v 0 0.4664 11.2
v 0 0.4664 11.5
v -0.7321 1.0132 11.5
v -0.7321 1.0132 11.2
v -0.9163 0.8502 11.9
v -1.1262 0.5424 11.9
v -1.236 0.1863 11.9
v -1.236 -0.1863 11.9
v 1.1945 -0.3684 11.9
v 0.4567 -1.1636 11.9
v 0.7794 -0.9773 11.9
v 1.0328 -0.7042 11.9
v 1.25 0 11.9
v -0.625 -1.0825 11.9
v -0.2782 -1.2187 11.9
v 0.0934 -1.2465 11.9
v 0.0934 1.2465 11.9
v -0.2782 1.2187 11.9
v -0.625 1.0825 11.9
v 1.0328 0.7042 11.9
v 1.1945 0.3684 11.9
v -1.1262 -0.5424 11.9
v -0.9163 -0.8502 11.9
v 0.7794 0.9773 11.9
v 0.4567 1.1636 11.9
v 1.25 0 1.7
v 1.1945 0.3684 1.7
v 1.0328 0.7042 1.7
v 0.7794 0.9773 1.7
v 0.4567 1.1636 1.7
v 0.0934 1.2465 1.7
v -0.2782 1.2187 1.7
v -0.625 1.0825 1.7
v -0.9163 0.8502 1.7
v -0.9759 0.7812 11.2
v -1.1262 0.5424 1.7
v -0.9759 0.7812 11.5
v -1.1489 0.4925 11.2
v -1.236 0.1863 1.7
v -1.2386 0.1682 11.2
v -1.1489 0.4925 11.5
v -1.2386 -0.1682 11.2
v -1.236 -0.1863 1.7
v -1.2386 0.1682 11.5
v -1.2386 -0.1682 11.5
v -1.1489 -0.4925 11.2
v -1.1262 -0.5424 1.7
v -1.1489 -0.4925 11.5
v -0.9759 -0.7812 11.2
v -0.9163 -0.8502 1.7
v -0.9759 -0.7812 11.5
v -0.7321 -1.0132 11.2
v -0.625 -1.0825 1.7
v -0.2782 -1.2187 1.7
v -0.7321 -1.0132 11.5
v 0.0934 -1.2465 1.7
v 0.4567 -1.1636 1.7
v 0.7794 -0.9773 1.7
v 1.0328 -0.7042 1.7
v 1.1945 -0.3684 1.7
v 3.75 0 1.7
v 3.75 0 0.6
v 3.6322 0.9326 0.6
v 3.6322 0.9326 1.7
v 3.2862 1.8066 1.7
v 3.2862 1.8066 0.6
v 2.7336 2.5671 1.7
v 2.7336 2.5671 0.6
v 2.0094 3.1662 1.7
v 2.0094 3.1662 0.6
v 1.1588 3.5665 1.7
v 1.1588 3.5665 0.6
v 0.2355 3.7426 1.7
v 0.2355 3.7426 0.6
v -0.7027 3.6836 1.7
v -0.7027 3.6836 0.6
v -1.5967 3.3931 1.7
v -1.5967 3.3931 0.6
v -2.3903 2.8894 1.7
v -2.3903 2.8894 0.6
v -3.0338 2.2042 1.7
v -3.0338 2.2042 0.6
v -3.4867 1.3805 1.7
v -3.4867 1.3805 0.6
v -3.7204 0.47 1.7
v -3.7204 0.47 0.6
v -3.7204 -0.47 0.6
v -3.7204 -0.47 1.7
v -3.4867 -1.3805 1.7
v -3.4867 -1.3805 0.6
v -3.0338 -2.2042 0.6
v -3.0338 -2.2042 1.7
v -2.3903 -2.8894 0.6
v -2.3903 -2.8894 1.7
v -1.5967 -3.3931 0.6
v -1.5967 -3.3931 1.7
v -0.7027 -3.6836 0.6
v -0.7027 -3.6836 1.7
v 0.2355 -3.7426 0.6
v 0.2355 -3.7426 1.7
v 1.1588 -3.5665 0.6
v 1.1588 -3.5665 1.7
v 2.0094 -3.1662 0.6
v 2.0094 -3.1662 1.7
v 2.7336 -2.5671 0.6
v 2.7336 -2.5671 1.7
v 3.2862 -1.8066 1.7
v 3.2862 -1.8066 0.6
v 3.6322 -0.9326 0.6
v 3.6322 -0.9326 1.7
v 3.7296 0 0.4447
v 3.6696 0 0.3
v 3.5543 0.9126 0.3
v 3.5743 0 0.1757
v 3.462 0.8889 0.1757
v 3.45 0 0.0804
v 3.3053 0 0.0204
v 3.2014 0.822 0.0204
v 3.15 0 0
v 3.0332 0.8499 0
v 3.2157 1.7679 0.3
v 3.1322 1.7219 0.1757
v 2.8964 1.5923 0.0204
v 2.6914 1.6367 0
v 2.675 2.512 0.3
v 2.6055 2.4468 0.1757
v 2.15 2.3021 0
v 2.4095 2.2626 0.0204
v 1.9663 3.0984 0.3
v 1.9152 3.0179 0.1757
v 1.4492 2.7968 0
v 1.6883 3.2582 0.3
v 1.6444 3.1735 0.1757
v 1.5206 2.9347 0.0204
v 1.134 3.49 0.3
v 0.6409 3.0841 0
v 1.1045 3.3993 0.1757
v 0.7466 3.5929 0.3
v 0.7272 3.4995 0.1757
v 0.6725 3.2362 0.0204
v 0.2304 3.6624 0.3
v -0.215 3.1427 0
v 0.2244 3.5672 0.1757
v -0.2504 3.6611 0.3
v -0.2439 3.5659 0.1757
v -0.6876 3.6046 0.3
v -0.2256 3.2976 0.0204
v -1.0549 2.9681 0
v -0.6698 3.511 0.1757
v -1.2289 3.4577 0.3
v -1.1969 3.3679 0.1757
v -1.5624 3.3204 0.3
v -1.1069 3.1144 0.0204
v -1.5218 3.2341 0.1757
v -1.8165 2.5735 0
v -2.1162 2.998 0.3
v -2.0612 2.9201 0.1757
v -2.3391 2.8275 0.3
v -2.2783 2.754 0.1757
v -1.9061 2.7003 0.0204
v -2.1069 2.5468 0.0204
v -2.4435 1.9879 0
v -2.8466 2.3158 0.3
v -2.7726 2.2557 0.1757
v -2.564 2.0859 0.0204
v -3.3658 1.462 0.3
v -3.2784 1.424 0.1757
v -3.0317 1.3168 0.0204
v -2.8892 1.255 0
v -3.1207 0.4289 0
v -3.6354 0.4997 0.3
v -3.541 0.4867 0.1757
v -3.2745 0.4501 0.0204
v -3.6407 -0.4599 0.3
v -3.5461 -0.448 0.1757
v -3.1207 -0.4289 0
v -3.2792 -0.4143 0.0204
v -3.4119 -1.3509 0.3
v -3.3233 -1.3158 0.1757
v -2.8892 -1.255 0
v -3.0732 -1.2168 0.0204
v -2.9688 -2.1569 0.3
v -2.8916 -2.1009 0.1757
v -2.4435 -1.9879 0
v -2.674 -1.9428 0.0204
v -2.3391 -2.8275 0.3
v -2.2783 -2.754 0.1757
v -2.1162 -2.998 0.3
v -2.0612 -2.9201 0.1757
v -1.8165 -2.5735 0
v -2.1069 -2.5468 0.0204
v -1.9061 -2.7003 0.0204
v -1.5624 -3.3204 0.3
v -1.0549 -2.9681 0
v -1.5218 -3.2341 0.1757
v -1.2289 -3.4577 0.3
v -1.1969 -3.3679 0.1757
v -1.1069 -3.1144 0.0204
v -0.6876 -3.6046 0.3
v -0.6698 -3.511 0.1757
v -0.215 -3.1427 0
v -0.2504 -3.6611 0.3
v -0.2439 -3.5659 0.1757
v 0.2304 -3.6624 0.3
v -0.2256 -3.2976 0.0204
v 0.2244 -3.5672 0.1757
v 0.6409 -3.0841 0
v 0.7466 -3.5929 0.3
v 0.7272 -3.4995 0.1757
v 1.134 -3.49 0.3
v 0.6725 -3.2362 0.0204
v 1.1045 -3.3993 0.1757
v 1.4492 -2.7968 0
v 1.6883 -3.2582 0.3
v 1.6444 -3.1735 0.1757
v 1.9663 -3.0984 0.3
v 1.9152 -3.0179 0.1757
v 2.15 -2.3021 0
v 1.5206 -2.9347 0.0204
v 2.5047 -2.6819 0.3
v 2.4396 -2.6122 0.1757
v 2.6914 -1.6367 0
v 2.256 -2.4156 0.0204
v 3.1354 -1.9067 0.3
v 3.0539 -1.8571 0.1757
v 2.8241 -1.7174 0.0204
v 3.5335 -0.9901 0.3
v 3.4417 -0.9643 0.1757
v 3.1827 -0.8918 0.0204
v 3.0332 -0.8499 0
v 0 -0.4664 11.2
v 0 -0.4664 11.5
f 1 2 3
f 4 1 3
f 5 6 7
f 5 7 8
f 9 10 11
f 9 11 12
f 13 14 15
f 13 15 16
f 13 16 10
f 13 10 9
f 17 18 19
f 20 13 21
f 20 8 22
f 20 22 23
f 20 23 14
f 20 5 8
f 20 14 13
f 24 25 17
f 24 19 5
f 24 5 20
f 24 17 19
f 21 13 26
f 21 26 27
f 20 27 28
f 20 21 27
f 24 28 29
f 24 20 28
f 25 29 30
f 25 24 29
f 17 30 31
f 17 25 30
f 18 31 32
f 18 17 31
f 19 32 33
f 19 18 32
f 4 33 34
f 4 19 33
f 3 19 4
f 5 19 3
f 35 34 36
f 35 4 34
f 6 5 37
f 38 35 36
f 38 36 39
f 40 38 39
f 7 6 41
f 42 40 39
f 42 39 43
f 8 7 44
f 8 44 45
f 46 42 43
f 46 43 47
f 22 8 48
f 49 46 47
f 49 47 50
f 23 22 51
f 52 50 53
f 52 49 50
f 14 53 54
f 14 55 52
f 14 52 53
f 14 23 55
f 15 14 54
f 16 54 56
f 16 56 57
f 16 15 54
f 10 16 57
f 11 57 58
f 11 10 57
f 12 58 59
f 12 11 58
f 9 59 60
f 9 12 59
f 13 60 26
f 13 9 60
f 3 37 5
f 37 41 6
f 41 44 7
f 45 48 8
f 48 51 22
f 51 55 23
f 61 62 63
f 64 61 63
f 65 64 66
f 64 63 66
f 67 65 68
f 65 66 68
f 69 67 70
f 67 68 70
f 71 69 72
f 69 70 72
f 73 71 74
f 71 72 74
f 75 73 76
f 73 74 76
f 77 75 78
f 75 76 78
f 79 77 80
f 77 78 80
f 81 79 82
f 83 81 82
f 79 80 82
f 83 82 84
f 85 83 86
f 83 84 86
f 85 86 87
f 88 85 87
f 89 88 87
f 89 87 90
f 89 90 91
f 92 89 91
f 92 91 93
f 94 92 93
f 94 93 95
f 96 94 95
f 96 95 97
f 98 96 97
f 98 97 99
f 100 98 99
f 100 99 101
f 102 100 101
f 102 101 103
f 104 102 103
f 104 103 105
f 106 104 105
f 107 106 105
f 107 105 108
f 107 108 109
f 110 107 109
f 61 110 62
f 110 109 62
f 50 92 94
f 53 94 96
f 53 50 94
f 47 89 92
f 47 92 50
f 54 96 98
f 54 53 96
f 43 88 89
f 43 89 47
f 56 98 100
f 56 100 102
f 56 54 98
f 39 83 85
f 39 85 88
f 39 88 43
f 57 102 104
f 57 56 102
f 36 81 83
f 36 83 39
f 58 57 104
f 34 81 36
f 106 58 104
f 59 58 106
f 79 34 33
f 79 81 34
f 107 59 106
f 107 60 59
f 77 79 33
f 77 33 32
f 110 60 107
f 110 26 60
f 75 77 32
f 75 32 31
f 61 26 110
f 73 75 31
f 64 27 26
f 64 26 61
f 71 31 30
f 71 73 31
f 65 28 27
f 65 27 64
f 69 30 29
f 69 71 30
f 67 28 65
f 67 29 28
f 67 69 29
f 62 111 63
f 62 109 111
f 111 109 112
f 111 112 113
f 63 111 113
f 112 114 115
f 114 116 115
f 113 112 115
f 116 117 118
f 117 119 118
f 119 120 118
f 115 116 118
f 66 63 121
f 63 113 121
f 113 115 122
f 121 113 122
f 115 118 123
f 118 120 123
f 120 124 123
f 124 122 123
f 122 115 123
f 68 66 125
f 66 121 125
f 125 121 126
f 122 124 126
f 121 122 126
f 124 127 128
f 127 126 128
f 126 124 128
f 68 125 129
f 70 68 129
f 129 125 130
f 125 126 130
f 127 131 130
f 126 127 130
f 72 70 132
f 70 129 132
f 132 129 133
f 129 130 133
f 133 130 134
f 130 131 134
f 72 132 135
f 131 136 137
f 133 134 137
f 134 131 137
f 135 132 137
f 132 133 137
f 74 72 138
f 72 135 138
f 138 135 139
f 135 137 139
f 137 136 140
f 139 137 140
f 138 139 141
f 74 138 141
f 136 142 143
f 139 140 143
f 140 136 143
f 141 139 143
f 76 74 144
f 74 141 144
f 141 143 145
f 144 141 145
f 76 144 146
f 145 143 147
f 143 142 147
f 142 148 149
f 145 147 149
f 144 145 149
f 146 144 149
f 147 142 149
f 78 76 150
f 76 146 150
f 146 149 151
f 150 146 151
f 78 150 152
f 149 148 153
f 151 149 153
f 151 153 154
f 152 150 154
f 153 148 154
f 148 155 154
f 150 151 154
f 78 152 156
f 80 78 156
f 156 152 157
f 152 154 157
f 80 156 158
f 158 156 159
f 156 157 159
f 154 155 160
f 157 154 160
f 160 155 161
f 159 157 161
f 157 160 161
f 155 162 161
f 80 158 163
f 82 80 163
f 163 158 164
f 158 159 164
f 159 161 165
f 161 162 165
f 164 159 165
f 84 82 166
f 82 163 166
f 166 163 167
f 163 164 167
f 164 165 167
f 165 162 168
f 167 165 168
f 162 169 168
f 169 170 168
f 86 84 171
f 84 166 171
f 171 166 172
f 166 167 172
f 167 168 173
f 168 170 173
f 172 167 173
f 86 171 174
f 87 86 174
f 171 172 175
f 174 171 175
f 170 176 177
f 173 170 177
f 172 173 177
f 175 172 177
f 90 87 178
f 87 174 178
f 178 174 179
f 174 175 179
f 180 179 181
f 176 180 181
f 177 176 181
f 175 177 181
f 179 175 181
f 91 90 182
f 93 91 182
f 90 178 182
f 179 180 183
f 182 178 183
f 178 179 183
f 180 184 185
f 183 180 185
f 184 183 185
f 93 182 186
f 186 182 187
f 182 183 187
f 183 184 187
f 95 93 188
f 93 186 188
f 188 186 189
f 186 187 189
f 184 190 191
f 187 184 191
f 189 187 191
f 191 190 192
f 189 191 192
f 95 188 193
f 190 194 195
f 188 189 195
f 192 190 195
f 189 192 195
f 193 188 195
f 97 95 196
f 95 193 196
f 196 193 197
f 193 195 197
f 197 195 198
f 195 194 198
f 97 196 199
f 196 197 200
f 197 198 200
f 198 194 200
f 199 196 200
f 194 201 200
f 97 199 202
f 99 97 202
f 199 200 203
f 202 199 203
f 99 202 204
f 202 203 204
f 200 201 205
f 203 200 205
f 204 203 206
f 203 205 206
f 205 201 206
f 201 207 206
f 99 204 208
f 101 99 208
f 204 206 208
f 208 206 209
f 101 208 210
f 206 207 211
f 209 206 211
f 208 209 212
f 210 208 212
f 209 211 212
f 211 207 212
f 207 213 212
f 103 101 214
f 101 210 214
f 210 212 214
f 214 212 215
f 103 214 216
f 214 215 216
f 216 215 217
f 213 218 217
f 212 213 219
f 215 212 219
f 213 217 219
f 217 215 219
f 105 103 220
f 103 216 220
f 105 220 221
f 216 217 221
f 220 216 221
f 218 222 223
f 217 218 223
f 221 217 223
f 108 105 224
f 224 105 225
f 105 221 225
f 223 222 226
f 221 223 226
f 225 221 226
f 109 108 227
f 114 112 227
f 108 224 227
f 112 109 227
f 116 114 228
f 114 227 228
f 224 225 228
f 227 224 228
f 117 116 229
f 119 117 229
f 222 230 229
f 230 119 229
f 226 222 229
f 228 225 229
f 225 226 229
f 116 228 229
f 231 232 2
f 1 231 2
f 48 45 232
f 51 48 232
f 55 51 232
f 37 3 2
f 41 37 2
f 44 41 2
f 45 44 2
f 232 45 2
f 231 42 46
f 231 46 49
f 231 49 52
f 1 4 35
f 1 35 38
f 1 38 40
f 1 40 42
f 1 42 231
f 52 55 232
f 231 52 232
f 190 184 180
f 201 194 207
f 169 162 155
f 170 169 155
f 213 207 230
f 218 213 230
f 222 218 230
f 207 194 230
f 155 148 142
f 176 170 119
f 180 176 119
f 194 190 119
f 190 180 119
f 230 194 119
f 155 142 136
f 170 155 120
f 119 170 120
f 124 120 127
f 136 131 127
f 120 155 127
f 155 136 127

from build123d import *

# Parameters (mm, degrees)
SKETCH1_R           = 3.75
BOSS_EXTRUDE1_DEPTH = 11.9
SKETCH2_R           = 3.75
SKETCH2_R_2         = 1.25
CUT_EXTRUDE1_DEPTH  = 10.2
FILLET1_R           = 0.6
CUT_EXTRUDE2_DEPTH  = 0.3


with BuildPart() as part:
    # Sketch1 → Boss-Extrude1 (new body)
    with BuildSketch(Plane.XY):
        Circle(SKETCH1_R)
    extrude(amount=BOSS_EXTRUDE1_DEPTH)

    # Sketch2 → Cut-Extrude1 (cut)
    with BuildSketch(Plane.XY.offset(11.9)):
        Circle(SKETCH2_R)
        Circle(SKETCH2_R_2, mode=Mode.SUBTRACT)
    extrude(amount=-CUT_EXTRUDE1_DEPTH, mode=Mode.SUBTRACT)

    # Fillet1
    fillet1_edges = [part.edges().sort_by_distance(p)[0] for p in [
        (-3.75, 0, 0),
    ]]
    fillet(fillet1_edges, radius=FILLET1_R)

    # Sketch3 → Cut-Extrude2 (cut)
    with BuildSketch(Plane.XY.offset(11.5)):
        with BuildLine():
            Line((0, 0.466411964), (-0.73212486, 1.013160002))
            ThreePointArc((-0.73212486, 1.013160002), (-1.25, 0), (-0.73212486, -1.013160002))
            Line((-0.73212486, -1.013160002), (0, -0.466411964))
            Line((0, -0.466411964), (0, 0.466411964))
        make_face()
    extrude(amount=-CUT_EXTRUDE2_DEPTH, mode=Mode.SUBTRACT)


solid = part.part
